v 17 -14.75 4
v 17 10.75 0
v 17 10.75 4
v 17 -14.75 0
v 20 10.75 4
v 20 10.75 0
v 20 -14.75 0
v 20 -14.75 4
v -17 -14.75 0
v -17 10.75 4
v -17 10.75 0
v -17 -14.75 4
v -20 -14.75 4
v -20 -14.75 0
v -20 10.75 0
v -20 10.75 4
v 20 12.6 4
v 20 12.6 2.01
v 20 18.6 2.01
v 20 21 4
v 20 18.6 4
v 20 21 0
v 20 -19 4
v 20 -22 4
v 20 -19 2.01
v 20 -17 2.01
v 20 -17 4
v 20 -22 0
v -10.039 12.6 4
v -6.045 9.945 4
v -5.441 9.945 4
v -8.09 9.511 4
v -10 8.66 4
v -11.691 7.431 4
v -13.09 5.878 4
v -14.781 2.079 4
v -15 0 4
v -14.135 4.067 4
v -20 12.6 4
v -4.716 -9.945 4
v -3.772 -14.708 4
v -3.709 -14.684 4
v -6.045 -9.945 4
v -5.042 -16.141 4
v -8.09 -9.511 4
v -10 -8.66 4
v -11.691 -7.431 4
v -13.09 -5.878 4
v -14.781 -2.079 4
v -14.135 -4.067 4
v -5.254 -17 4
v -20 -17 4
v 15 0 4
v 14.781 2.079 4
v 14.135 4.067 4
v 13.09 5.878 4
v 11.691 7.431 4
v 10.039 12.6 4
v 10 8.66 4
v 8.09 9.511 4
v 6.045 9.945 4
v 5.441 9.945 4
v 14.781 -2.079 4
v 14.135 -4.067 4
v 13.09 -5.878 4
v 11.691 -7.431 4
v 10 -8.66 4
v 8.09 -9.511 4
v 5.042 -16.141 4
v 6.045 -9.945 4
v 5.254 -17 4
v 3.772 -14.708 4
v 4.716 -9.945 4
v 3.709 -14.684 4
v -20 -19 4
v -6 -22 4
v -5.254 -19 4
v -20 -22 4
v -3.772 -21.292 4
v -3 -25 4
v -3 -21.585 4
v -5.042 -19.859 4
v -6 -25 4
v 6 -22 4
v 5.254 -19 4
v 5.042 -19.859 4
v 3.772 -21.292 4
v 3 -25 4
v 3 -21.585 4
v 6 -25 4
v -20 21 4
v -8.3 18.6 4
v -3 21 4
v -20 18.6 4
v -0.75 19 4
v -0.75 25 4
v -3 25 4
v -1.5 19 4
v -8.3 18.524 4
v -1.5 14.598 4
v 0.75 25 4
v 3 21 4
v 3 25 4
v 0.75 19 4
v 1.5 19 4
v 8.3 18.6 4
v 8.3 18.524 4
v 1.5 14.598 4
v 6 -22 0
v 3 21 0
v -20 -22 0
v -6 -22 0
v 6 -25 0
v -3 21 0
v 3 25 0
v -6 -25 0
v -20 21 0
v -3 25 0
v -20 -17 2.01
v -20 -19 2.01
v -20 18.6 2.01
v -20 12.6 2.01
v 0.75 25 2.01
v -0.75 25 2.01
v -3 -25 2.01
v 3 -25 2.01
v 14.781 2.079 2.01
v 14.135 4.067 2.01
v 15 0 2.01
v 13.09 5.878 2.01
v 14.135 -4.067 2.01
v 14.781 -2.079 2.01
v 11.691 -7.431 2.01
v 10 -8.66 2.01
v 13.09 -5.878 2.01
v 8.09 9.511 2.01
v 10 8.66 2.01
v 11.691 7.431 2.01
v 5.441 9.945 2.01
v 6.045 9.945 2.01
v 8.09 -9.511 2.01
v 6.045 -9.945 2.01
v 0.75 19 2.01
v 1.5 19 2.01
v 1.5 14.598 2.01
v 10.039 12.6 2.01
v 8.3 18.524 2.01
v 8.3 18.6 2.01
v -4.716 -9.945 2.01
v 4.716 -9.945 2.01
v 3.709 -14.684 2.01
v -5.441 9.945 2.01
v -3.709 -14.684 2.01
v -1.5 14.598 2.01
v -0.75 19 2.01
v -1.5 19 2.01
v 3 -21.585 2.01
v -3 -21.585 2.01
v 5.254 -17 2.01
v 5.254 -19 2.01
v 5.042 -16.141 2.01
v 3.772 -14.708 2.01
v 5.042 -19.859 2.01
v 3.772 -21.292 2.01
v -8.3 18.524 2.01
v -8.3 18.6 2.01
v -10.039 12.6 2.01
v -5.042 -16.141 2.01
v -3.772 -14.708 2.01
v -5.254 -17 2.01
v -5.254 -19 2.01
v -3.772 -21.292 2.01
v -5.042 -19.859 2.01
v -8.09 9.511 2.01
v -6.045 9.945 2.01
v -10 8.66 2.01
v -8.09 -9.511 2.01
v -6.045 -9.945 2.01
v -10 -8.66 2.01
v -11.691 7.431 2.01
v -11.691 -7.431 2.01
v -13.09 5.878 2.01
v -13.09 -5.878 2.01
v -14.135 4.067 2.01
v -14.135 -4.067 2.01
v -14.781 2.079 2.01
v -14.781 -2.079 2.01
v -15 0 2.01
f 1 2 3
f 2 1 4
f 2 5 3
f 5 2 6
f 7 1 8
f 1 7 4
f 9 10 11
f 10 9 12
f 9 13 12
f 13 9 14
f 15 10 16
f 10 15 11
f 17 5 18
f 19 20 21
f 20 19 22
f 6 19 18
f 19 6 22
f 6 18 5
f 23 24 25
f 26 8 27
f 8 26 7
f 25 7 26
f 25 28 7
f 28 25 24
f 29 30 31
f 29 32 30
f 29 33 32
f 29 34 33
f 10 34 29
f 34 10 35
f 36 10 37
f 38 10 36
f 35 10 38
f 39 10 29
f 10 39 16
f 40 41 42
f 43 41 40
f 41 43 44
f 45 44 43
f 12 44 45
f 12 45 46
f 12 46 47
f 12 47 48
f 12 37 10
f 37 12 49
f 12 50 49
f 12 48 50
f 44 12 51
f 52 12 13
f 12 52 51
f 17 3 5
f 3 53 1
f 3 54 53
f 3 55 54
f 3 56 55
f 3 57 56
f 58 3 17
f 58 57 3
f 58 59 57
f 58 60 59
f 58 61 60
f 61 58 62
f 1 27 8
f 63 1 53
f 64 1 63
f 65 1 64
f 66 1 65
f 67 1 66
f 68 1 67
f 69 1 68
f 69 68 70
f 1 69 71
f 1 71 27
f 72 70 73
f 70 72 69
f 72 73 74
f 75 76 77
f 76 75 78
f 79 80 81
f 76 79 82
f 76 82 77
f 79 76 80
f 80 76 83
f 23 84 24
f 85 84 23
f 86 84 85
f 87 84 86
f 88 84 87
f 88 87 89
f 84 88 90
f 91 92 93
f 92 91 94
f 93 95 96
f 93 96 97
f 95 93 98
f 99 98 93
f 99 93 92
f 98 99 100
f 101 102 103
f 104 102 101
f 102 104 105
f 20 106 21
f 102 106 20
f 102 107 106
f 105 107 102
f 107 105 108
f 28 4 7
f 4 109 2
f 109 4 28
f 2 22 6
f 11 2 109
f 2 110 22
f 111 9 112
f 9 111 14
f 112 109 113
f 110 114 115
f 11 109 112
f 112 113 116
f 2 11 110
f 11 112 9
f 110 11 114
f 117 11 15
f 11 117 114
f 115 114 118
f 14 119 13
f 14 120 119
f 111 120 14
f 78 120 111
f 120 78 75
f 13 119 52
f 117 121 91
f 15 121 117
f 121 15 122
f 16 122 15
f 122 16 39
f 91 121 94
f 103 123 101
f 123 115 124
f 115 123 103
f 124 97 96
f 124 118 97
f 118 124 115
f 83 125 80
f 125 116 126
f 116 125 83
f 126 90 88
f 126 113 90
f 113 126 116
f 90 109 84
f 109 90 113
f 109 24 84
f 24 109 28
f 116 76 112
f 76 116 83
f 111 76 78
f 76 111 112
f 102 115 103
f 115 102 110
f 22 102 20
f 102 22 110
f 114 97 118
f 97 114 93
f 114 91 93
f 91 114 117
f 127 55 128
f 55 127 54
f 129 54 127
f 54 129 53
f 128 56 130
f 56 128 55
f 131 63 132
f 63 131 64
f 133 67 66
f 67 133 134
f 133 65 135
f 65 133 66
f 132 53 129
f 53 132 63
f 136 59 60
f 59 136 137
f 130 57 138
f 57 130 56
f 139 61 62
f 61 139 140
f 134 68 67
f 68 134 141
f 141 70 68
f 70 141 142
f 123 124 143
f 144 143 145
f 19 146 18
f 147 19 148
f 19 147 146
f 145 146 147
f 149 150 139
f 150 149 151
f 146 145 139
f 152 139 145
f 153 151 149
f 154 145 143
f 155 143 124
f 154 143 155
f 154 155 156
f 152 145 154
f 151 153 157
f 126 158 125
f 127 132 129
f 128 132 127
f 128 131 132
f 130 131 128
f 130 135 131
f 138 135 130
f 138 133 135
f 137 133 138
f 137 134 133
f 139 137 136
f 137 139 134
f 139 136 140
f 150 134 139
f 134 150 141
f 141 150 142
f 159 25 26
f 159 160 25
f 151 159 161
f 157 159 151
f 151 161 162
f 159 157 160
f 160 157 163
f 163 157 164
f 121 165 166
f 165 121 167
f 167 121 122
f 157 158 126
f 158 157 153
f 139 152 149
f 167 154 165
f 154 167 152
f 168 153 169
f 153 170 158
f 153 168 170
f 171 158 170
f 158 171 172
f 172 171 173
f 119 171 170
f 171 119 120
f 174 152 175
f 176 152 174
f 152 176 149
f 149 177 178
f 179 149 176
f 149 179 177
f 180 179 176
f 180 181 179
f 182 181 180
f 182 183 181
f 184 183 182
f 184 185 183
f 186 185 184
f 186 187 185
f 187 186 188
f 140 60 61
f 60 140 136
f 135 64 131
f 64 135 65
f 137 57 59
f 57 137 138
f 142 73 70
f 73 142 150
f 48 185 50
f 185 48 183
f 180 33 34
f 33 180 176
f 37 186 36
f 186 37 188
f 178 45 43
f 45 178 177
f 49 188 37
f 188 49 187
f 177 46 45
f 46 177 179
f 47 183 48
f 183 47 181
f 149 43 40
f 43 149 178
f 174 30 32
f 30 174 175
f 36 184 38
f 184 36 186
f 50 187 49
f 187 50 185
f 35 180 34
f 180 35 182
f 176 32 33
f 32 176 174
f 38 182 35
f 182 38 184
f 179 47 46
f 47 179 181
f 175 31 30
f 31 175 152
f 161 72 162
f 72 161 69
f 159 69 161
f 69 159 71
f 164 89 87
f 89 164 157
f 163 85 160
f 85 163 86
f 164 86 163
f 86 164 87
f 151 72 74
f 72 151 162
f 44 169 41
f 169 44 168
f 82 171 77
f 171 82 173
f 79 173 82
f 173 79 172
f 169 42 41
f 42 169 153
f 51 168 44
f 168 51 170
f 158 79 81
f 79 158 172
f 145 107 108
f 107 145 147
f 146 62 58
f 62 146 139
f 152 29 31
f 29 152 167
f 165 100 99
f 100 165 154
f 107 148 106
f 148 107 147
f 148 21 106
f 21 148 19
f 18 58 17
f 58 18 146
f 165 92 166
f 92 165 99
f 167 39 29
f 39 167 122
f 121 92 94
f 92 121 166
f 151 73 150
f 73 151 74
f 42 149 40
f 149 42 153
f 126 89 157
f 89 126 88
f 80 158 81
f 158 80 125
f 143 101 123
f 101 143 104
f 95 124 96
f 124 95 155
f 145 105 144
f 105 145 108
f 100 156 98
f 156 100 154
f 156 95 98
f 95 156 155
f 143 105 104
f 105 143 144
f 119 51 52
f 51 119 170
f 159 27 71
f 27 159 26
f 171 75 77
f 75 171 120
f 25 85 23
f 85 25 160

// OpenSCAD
difference() {
translate([0,0,2]) difference() {
difference() {
difference() {
cube([40,50,4],center=true); 
union() {
translate([27,-2,0]) cube([20,25.5,6],center=true); 
rotate([0,180,0]) translate([27,-2,0]) cube([20,25.5,6],center=true); 
} 
}
union() {
translate([13.5,-27,0]) cube([15,10,6],center=true); 
rotate([0,180,0]) translate([13.5,-27,0]) cube([15,10,6],center=true); 
}
}
union() {
translate([12,26,0]) cube([18,10,6],center=true); 
rotate([0,180,0]) translate([12,26,0]) cube([18,10,6],center=true); 
}
}
translate([0,0,2.01]) union() {
translate([0,-18,1]) cube([60,2,2],center=true); 
union() {
union() {
union() {
union() {
union() {
translate([5,0,0]) cylinder(2,10,10); 
rotate([0,0,180]) translate([5,0,0]) cylinder(2,10,10); 
}
translate([0,-18,0]) union() {
translate([1.5,0,0]) cylinder(2,4,4); 
rotate([0,0,180]) translate([1.5,0,0]) cylinder(2,4,4); 
}
}
translate([0,12,1]) union() {
translate([3,0,0]) rotate([0,0,30]) cube([16,6,2],center=true); 
rotate([0,180,0]) translate([3,0,0]) rotate([0,0,30]) cube([16,6,2],center=true); 
}
}
translate([0,0,1]) union() {
translate([16.3,15.6,0]) cube([16,6,2],center=true); 
rotate([0,180,0]) translate([16.3,15.6,0]) cube([16,6,2],center=true); 
}
}
union() {
union() {
translate([0,-6,1]) cube([6,40,2],center=true); 
translate([0,0,1]) union() {
translate([1,-13,0]) rotate([0,0,-12]) cube([6,10,2],center=true); 
rotate([0,180,0]) translate([1,-13,0]) rotate([0,0,-12]) cube([6,10,2],center=true); 
}
}
translate([0,15,1]) union() {
cube([1.5,25,2],center=true); 
cube([3,8,2],center=true); 
}
}
}
}
}
